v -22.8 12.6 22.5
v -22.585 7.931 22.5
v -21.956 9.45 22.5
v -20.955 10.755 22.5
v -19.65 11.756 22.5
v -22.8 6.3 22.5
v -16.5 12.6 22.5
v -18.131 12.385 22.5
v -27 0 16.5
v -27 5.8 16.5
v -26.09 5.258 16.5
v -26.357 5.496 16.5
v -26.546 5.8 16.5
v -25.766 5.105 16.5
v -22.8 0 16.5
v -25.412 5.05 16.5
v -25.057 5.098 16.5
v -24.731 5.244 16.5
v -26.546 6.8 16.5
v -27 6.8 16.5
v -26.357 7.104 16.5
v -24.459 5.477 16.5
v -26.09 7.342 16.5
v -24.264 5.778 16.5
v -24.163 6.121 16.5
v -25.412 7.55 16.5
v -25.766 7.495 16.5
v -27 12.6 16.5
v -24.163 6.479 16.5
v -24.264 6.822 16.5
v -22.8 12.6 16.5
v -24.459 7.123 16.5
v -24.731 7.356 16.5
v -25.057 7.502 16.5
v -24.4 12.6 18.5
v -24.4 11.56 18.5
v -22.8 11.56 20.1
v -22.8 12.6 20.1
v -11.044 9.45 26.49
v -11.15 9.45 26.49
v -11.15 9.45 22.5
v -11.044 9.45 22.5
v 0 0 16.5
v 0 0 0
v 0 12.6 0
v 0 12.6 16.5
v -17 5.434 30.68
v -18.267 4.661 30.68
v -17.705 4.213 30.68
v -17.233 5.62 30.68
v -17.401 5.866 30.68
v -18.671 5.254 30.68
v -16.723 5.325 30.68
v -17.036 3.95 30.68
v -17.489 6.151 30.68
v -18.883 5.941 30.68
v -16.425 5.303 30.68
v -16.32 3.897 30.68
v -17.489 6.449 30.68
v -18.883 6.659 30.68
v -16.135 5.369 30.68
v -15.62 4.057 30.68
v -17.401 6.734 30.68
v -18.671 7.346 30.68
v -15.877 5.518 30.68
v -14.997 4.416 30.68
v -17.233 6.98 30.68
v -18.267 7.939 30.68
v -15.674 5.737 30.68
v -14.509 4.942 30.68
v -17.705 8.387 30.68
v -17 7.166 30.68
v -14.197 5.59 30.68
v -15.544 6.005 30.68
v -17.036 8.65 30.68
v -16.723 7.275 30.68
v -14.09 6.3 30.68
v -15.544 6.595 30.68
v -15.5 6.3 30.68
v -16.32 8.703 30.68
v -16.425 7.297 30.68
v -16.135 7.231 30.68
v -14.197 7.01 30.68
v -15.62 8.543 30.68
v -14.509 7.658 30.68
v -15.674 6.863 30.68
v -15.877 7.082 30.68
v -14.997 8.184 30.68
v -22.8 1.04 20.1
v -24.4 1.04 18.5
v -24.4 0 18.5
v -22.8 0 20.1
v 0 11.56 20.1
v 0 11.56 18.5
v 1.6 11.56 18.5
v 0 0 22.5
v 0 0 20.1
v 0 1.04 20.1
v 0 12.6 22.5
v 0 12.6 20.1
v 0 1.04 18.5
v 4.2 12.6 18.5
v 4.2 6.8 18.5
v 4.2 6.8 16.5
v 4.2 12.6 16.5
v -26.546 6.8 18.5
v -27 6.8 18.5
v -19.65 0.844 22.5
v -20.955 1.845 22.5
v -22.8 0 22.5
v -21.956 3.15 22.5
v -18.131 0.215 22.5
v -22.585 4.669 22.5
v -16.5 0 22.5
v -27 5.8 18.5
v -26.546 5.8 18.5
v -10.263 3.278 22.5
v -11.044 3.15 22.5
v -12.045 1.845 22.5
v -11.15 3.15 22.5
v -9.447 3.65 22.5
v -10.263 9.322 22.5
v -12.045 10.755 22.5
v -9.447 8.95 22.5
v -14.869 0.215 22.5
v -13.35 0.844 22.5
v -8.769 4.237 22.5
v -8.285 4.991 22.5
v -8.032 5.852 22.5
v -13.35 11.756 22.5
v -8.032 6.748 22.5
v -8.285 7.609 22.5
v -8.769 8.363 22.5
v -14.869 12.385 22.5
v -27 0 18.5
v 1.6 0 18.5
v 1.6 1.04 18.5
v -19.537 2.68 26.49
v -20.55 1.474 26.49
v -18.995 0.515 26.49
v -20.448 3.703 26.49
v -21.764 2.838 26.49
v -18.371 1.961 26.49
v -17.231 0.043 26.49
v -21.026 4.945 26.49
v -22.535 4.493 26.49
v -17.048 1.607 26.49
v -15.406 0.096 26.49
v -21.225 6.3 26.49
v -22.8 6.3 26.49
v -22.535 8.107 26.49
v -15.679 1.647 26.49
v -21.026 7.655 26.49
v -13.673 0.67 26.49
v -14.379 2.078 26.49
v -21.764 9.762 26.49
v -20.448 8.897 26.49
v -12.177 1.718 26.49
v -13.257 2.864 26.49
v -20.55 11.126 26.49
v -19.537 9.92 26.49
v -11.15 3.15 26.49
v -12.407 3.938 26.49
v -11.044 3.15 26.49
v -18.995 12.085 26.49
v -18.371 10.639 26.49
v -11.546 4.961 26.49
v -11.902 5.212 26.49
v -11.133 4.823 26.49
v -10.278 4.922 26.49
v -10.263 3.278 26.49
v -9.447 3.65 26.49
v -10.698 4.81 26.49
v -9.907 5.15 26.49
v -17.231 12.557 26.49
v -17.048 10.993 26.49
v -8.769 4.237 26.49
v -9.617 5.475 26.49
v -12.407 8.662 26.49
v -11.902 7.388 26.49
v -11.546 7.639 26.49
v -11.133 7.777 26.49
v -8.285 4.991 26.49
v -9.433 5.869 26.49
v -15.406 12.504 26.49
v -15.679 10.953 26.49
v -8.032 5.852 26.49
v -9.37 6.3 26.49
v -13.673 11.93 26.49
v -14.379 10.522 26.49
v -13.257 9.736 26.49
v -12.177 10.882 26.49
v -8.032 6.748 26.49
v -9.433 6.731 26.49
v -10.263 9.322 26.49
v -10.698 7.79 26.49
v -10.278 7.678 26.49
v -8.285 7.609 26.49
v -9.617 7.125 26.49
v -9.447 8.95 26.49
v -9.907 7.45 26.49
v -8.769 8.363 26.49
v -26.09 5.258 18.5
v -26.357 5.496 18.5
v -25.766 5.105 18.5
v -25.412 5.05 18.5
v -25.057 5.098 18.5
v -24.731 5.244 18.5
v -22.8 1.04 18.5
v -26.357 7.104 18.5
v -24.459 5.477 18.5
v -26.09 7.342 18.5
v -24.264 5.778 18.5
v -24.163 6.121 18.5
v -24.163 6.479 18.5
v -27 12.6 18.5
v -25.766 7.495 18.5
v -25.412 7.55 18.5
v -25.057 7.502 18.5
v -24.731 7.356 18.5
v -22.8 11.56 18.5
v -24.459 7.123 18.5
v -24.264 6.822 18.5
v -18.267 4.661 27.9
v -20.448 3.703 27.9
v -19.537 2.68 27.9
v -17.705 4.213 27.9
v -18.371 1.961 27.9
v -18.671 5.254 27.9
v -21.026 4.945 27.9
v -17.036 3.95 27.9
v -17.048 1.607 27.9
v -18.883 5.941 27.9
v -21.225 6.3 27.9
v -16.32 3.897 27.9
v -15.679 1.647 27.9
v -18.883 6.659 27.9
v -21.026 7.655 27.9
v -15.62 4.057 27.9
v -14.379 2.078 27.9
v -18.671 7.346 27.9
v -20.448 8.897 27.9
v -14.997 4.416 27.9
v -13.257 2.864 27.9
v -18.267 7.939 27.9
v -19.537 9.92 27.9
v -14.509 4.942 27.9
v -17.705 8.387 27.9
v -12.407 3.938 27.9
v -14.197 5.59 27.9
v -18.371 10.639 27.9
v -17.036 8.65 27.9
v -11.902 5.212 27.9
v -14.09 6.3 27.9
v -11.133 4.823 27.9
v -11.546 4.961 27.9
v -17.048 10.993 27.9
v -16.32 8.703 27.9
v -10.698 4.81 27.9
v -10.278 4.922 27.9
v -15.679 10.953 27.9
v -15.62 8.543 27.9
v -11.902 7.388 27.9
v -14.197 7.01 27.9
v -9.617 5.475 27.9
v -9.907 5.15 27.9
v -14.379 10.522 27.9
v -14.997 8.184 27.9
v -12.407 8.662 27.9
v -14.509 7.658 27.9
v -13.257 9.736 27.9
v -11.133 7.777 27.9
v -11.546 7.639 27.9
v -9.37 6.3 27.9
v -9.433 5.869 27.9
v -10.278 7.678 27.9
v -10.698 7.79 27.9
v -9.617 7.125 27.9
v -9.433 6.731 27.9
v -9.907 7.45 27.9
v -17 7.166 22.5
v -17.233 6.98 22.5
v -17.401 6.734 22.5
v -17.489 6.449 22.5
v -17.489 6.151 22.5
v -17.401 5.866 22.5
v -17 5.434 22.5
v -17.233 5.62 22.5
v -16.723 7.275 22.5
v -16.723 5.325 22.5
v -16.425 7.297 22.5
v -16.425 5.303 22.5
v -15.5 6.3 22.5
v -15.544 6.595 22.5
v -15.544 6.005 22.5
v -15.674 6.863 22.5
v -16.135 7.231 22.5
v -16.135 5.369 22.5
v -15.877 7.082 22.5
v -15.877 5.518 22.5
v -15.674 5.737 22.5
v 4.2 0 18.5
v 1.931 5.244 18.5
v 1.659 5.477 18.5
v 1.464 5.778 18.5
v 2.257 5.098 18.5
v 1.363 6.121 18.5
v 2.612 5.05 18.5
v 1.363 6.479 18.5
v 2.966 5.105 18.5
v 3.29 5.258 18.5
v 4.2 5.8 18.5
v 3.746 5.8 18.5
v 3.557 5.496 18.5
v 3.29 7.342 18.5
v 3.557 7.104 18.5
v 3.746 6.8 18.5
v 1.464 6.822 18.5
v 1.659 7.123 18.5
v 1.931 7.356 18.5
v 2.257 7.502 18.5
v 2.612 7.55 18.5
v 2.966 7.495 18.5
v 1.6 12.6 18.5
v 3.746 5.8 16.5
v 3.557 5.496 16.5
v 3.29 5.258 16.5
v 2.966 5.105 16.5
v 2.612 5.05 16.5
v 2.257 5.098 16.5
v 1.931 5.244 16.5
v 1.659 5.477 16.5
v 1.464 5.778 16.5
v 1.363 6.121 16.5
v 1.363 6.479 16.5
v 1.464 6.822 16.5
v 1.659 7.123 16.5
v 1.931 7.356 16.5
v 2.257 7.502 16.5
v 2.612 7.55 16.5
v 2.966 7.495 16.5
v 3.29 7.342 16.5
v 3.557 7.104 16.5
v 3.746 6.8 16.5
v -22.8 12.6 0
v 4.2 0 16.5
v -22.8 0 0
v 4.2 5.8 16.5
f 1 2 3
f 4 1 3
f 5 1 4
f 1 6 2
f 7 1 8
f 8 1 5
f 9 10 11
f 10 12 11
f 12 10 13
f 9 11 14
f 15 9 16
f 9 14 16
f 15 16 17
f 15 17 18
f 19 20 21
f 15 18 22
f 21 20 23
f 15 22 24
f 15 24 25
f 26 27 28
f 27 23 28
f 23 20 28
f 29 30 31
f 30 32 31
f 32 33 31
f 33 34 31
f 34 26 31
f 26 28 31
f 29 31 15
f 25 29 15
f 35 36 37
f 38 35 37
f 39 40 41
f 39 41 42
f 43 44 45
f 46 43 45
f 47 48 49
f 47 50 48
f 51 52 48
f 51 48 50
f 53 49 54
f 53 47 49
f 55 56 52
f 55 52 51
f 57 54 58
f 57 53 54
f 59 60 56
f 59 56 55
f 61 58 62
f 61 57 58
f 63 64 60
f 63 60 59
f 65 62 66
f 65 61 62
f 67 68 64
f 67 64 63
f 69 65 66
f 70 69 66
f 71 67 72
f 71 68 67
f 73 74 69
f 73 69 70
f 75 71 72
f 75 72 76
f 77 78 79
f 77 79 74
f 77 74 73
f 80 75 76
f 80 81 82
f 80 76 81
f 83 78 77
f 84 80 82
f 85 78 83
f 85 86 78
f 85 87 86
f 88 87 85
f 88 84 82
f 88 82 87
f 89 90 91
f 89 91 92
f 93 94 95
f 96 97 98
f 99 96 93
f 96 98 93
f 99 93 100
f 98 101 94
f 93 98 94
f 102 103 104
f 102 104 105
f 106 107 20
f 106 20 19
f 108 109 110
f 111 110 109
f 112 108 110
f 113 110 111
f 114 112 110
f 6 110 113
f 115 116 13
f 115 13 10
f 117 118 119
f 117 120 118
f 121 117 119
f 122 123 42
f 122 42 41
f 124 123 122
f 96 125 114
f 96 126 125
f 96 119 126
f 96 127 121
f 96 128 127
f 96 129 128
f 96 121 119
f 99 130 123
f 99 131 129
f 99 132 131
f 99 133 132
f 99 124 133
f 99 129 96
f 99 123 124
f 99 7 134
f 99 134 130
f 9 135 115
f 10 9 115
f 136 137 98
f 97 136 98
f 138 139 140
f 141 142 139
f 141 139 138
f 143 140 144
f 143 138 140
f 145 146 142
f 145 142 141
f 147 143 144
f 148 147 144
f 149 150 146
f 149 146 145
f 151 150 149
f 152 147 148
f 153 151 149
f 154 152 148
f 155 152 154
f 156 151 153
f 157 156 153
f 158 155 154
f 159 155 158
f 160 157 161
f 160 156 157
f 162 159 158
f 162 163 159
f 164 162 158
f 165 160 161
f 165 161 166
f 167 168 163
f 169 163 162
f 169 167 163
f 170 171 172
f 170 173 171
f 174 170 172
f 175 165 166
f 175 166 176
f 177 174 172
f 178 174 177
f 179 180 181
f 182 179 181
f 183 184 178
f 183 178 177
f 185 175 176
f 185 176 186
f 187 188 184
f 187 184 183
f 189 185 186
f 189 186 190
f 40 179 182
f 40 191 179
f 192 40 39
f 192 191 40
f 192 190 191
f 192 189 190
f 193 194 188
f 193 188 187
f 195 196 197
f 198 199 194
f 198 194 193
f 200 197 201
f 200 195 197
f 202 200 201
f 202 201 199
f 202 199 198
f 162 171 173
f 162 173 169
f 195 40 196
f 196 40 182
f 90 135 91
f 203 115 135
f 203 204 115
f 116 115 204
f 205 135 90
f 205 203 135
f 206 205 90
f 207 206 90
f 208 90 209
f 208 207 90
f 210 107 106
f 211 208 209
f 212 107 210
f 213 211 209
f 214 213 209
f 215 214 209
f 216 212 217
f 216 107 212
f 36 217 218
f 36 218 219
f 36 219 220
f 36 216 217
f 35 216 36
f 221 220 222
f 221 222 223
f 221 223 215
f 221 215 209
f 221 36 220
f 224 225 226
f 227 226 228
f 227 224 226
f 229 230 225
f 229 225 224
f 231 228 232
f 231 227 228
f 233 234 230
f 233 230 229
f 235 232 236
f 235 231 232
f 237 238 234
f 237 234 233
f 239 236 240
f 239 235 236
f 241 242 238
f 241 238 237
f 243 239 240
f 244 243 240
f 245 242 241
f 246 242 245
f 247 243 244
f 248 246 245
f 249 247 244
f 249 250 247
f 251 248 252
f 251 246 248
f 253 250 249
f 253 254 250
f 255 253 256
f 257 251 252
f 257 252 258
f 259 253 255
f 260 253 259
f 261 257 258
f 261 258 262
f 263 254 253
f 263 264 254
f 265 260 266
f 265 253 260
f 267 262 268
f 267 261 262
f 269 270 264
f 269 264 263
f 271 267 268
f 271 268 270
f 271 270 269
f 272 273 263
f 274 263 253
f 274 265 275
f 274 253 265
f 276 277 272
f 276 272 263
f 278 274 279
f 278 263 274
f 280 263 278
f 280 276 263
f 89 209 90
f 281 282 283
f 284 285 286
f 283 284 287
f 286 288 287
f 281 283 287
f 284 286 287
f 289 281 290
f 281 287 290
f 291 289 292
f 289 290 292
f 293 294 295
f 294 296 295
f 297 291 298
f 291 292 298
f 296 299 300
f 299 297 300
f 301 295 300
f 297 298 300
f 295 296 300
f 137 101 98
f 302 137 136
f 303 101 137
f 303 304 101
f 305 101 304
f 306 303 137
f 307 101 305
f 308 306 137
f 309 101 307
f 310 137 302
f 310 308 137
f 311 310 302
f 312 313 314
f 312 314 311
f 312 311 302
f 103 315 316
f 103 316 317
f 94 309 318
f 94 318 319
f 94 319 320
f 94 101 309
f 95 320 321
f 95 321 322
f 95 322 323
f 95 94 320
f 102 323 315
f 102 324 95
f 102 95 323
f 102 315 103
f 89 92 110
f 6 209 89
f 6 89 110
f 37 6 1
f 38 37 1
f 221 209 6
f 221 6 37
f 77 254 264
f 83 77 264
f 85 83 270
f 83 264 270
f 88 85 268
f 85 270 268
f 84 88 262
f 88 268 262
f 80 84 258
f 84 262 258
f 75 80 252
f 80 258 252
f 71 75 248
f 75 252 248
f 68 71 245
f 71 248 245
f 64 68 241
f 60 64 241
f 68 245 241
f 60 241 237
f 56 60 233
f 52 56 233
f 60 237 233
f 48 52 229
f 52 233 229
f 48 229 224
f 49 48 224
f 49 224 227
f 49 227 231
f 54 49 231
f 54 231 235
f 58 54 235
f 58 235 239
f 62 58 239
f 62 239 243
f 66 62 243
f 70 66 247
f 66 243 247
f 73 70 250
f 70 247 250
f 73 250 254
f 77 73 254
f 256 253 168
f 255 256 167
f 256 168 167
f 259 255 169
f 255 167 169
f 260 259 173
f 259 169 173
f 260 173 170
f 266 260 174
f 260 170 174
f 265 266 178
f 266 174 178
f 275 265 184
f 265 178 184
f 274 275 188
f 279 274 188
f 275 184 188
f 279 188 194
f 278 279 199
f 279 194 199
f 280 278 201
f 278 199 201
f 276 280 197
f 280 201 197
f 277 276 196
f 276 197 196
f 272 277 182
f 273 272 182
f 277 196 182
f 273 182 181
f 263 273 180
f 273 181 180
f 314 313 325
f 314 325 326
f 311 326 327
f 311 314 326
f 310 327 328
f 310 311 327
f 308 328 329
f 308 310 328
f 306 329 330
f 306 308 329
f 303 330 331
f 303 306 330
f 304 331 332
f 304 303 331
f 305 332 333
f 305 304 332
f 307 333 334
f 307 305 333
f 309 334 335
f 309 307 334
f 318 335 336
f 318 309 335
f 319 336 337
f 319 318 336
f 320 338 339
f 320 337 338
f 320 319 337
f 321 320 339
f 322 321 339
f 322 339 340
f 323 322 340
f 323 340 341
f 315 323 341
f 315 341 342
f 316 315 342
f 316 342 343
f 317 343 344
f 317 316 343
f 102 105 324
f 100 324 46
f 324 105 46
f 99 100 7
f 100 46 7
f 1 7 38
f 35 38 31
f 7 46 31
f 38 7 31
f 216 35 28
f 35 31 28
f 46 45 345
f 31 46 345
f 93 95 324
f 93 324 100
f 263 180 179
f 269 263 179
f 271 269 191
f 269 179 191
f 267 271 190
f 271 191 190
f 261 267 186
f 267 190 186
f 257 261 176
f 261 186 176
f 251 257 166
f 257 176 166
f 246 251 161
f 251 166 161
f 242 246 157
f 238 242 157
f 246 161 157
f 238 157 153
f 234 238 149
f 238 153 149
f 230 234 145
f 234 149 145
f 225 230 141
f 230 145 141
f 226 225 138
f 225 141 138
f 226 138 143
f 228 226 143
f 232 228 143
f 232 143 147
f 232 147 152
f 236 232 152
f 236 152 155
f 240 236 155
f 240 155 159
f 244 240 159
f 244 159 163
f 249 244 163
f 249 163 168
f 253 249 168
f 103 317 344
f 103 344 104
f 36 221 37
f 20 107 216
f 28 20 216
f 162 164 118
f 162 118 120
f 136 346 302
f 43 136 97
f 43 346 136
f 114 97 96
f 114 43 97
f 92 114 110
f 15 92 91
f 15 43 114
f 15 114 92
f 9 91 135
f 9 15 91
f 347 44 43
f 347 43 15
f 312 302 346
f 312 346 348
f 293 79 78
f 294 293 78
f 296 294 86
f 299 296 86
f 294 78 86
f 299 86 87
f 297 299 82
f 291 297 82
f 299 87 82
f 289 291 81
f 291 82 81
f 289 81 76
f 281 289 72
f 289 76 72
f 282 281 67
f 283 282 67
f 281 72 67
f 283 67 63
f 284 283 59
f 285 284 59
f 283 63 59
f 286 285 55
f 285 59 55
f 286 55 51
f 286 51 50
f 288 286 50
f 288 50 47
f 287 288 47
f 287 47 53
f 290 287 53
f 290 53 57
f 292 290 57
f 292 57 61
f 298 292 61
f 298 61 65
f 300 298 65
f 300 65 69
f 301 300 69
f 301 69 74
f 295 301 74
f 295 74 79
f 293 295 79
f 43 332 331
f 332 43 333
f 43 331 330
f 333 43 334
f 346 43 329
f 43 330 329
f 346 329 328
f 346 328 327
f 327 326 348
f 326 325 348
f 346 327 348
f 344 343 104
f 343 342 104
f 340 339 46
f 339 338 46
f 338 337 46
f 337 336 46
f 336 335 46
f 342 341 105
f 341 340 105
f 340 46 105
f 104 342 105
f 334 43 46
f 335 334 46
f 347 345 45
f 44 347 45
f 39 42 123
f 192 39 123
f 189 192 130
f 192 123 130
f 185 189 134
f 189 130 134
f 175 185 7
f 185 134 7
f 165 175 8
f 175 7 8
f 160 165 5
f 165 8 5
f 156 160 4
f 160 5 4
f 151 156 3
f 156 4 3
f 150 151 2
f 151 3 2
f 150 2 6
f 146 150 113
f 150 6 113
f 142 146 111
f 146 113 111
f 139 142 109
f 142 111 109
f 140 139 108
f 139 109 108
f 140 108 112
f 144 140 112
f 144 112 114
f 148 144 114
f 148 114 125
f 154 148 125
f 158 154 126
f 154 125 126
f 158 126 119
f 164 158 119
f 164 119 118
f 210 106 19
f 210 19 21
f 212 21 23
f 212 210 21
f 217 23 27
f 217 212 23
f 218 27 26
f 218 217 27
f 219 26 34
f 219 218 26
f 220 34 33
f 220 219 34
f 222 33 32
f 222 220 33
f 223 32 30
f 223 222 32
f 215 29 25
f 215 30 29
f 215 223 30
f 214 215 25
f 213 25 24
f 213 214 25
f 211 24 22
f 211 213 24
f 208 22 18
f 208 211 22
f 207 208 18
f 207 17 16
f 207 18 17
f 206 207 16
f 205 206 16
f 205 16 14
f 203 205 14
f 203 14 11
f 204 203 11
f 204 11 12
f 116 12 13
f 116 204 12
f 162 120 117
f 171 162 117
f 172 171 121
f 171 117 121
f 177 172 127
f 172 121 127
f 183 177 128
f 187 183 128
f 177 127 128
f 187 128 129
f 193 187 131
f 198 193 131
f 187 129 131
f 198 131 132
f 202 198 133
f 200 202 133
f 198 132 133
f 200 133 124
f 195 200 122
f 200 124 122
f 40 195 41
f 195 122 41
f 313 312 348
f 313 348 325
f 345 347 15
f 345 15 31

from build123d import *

# Parameters (mm, degrees)
ESQUISSE1_W              = 22.8
ESQUISSE1_H              = 12.6
BOSS_EXTRU_1_DEPTH       = 22.5
ESQUISSE2_W              = 31.2
ESQUISSE2_H              = 12.6
BOSS_EXTRU_2_DEPTH       = 2
ENL_V_MAT_EXTRU_1_DEPTH  = 36.0714984
BOSS_EXTRU_3_DEPTH       = 3.99
BOSS_EXTRUDE6_DEPTH      = 1.41
BOSS_EXTRUDE6_DEPTH_BACK = 4
SKETCH1_R                = 4.725
SKETCH1_R_2              = 1.5
SKETCH3_R                = 2.41
BOSS_EXTRUDE7_DEPTH      = 2.78
SKETCH4_R                = 1
CUT_EXTRUDE1_DEPTH       = 9.78
SKETCH8_W                = 1.6
SKETCH8_H                = 1.04
BOSS_EXTRUDE9_DEPTH      = 1.6
CUT_EXTRUDE3_DEPTH       = 43.472296853
MIRROR3_COPY_1_SKETCH_W  = 22.8
MIRROR3_COPY_1_SKETCH_H  = 12.6
MIRROR3_COPY_1_DEPTH     = 22.5
MIRROR3_COPY_2_SKETCH_W  = 1.6
MIRROR3_COPY_2_SKETCH_H  = 1.04
MIRROR3_COPY_2_DEPTH     = 1.6
MIRROR3_COPY_3_DEPTH     = 43.472296853


with BuildPart() as part:
    # Esquisse1 → Boss.-Extru.1 (new body)
    with BuildSketch(Plane.XY):
        with Locations((-11.4, 6.3)):
            Rectangle(ESQUISSE1_W, ESQUISSE1_H)
    boss_extru_1 = extrude(amount=BOSS_EXTRU_1_DEPTH)

    # Esquisse2 → Boss.-Extru.2 (add)
    with BuildSketch(Plane.XY.offset(18.5)):
        with Locations((-11.4, 6.3)):
            Rectangle(ESQUISSE2_W, ESQUISSE2_H)
    extrude(amount=-BOSS_EXTRU_2_DEPTH)

    # Esquisse3 → Enlèv. mat.-Extru.1 (cut, through all)
    with BuildSketch(Plane.XY.offset(18.5)):
        with BuildLine():
            Line((3.745643924, 6.8), (4.2, 6.8))
            Line((4.2, 6.8), (4.2, 5.8))
            Line((4.2, 5.8), (3.745643924, 5.8))
            ThreePointArc((3.745643924, 5.8), (1.35, 6.3), (3.745643924, 6.8))
        make_face()
        with BuildLine():
            Line((-26.545643924, 5.8), (-27, 5.8))
            Line((-27, 5.8), (-27, 6.8))
            Line((-27, 6.8), (-26.545643924, 6.8))
            ThreePointArc((-26.545643924, 6.8), (-24.15, 6.3), (-26.545643924, 5.8))
        make_face()
    extrude(amount=-ENL_V_MAT_EXTRU_1_DEPTH, mode=Mode.SUBTRACT)

    # Esquisse4 → Boss.-Extru.3 (add)
    with BuildSketch(Plane.XY.offset(22.5)):
        with BuildLine():
            Line((-11.15, 9.45), (-11.044039956, 9.45))
            ThreePointArc((-11.044039956, 9.45), (-22.8, 6.3), (-11.044039956, 3.15))
            Line((-11.044039956, 3.15), (-11.15, 3.15))
            ThreePointArc((-11.15, 3.15), (-8, 6.3), (-11.15, 9.45))
        make_face()
    extrude(amount=BOSS_EXTRU_3_DEPTH)

    # Sketch1 → Boss-Extrude6 (add, two sides: drawn at the far end of the back side and taken through both)
    with BuildSketch(Plane.XY.offset(26.49).offset(-BOSS_EXTRUDE6_DEPTH_BACK)):
        with Locations((-16.5, 6.3)):
            Circle(SKETCH1_R)
        with Locations((-10.87, 6.3)):
            Circle(SKETCH1_R_2)
    extrude(amount=BOSS_EXTRUDE6_DEPTH + BOSS_EXTRUDE6_DEPTH_BACK)

    # Sketch3 → Boss-Extrude7 (add)
    with BuildSketch(Plane.XY.offset(27.9)):
        with Locations((-16.5, 6.3)):
            Circle(SKETCH3_R)
    extrude(amount=BOSS_EXTRUDE7_DEPTH)

    # Sketch4 → Cut-Extrude1 (cut)
    with BuildSketch(Plane.XY.offset(30.68)):
        with Locations((-16.5, 6.3)):
            Circle(SKETCH4_R)
    extrude(amount=-CUT_EXTRUDE1_DEPTH, mode=Mode.SUBTRACT)

    # Sketch8 → Boss-Extrude9 (add)
    with BuildSketch(Plane.XY.offset(18.5)):
        with Locations((0.8, 0.52)):
            Rectangle(SKETCH8_W, SKETCH8_H)
    boss_extrude9 = extrude(amount=BOSS_EXTRUDE9_DEPTH)

    # Sketch9 → Cut-Extrude3 (cut, through all)
    with BuildSketch(Plane(origin=(0, 1.04, 0), x_dir=(1, 0, 0), z_dir=(0, 1, 0))):
        Polygon((1.6, -18.5), (0, -20.1), (1.6, -20.1), align=None)
    cut_extrude3 = extrude(amount=-CUT_EXTRUDE3_DEPTH, mode=Mode.SUBTRACT)

    # Mirror1: Boss.-Extru.1, Boss-Extrude9, Cut-Extrude3 across plane
    add(boss_extru_1.mirror(Plane(origin=(0, 6.3, 0), x_dir=(0, 0, 1), z_dir=(0, -1, 0))))
    add(boss_extrude9.mirror(Plane(origin=(0, 6.3, 0), x_dir=(0, 0, 1), z_dir=(0, -1, 0))))
    add(cut_extrude3.mirror(Plane(origin=(0, 6.3, 0), x_dir=(0, 0, 1), z_dir=(0, -1, 0))), mode=Mode.SUBTRACT)

    # Mirror3: Boss.-Extru.1, Boss-Extrude9, Cut-Extrude3 across plane
    add(boss_extru_1.mirror(Plane(origin=(-11.4, 0, 0), x_dir=(0, 0, 1), z_dir=(1, 0, 0))))
    add(boss_extrude9.mirror(Plane(origin=(-11.4, 0, 0), x_dir=(0, 0, 1), z_dir=(1, 0, 0))))
    add(cut_extrude3.mirror(Plane(origin=(-11.4, 0, 0), x_dir=(0, 0, 1), z_dir=(1, 0, 0))), mode=Mode.SUBTRACT)

    # Mirror3 copy 1 sketch → Mirror3 copy 1 (add)
    with BuildSketch(Plane(origin=(-22.8, 12.6, 0), x_dir=(-1, 0, 0), z_dir=(0, 0, 1))):
        with Locations((-11.4, 6.3)):
            Rectangle(MIRROR3_COPY_1_SKETCH_W, MIRROR3_COPY_1_SKETCH_H)
    extrude(amount=MIRROR3_COPY_1_DEPTH)

    # Mirror3 copy 2 sketch → Mirror3 copy 2 (add)
    with BuildSketch(Plane(origin=(-22.8, 12.6, 18.5), x_dir=(-1, 0, 0), z_dir=(0, 0, 1))):
        with Locations((0.8, 0.52)):
            Rectangle(MIRROR3_COPY_2_SKETCH_W, MIRROR3_COPY_2_SKETCH_H)
    extrude(amount=MIRROR3_COPY_2_DEPTH)

    # Mirror3 copy 3 sketch → Mirror3 copy 3 (cut, through all)
    with BuildSketch(Plane(origin=(-22.8, 11.56, 0), x_dir=(-1, 0, 0), z_dir=(0, -1, 0))):
        Polygon((1.6, -18.5), (0, -20.1), (1.6, -20.1), align=None)
    extrude(amount=-MIRROR3_COPY_3_DEPTH, mode=Mode.SUBTRACT)


solid = part.part
